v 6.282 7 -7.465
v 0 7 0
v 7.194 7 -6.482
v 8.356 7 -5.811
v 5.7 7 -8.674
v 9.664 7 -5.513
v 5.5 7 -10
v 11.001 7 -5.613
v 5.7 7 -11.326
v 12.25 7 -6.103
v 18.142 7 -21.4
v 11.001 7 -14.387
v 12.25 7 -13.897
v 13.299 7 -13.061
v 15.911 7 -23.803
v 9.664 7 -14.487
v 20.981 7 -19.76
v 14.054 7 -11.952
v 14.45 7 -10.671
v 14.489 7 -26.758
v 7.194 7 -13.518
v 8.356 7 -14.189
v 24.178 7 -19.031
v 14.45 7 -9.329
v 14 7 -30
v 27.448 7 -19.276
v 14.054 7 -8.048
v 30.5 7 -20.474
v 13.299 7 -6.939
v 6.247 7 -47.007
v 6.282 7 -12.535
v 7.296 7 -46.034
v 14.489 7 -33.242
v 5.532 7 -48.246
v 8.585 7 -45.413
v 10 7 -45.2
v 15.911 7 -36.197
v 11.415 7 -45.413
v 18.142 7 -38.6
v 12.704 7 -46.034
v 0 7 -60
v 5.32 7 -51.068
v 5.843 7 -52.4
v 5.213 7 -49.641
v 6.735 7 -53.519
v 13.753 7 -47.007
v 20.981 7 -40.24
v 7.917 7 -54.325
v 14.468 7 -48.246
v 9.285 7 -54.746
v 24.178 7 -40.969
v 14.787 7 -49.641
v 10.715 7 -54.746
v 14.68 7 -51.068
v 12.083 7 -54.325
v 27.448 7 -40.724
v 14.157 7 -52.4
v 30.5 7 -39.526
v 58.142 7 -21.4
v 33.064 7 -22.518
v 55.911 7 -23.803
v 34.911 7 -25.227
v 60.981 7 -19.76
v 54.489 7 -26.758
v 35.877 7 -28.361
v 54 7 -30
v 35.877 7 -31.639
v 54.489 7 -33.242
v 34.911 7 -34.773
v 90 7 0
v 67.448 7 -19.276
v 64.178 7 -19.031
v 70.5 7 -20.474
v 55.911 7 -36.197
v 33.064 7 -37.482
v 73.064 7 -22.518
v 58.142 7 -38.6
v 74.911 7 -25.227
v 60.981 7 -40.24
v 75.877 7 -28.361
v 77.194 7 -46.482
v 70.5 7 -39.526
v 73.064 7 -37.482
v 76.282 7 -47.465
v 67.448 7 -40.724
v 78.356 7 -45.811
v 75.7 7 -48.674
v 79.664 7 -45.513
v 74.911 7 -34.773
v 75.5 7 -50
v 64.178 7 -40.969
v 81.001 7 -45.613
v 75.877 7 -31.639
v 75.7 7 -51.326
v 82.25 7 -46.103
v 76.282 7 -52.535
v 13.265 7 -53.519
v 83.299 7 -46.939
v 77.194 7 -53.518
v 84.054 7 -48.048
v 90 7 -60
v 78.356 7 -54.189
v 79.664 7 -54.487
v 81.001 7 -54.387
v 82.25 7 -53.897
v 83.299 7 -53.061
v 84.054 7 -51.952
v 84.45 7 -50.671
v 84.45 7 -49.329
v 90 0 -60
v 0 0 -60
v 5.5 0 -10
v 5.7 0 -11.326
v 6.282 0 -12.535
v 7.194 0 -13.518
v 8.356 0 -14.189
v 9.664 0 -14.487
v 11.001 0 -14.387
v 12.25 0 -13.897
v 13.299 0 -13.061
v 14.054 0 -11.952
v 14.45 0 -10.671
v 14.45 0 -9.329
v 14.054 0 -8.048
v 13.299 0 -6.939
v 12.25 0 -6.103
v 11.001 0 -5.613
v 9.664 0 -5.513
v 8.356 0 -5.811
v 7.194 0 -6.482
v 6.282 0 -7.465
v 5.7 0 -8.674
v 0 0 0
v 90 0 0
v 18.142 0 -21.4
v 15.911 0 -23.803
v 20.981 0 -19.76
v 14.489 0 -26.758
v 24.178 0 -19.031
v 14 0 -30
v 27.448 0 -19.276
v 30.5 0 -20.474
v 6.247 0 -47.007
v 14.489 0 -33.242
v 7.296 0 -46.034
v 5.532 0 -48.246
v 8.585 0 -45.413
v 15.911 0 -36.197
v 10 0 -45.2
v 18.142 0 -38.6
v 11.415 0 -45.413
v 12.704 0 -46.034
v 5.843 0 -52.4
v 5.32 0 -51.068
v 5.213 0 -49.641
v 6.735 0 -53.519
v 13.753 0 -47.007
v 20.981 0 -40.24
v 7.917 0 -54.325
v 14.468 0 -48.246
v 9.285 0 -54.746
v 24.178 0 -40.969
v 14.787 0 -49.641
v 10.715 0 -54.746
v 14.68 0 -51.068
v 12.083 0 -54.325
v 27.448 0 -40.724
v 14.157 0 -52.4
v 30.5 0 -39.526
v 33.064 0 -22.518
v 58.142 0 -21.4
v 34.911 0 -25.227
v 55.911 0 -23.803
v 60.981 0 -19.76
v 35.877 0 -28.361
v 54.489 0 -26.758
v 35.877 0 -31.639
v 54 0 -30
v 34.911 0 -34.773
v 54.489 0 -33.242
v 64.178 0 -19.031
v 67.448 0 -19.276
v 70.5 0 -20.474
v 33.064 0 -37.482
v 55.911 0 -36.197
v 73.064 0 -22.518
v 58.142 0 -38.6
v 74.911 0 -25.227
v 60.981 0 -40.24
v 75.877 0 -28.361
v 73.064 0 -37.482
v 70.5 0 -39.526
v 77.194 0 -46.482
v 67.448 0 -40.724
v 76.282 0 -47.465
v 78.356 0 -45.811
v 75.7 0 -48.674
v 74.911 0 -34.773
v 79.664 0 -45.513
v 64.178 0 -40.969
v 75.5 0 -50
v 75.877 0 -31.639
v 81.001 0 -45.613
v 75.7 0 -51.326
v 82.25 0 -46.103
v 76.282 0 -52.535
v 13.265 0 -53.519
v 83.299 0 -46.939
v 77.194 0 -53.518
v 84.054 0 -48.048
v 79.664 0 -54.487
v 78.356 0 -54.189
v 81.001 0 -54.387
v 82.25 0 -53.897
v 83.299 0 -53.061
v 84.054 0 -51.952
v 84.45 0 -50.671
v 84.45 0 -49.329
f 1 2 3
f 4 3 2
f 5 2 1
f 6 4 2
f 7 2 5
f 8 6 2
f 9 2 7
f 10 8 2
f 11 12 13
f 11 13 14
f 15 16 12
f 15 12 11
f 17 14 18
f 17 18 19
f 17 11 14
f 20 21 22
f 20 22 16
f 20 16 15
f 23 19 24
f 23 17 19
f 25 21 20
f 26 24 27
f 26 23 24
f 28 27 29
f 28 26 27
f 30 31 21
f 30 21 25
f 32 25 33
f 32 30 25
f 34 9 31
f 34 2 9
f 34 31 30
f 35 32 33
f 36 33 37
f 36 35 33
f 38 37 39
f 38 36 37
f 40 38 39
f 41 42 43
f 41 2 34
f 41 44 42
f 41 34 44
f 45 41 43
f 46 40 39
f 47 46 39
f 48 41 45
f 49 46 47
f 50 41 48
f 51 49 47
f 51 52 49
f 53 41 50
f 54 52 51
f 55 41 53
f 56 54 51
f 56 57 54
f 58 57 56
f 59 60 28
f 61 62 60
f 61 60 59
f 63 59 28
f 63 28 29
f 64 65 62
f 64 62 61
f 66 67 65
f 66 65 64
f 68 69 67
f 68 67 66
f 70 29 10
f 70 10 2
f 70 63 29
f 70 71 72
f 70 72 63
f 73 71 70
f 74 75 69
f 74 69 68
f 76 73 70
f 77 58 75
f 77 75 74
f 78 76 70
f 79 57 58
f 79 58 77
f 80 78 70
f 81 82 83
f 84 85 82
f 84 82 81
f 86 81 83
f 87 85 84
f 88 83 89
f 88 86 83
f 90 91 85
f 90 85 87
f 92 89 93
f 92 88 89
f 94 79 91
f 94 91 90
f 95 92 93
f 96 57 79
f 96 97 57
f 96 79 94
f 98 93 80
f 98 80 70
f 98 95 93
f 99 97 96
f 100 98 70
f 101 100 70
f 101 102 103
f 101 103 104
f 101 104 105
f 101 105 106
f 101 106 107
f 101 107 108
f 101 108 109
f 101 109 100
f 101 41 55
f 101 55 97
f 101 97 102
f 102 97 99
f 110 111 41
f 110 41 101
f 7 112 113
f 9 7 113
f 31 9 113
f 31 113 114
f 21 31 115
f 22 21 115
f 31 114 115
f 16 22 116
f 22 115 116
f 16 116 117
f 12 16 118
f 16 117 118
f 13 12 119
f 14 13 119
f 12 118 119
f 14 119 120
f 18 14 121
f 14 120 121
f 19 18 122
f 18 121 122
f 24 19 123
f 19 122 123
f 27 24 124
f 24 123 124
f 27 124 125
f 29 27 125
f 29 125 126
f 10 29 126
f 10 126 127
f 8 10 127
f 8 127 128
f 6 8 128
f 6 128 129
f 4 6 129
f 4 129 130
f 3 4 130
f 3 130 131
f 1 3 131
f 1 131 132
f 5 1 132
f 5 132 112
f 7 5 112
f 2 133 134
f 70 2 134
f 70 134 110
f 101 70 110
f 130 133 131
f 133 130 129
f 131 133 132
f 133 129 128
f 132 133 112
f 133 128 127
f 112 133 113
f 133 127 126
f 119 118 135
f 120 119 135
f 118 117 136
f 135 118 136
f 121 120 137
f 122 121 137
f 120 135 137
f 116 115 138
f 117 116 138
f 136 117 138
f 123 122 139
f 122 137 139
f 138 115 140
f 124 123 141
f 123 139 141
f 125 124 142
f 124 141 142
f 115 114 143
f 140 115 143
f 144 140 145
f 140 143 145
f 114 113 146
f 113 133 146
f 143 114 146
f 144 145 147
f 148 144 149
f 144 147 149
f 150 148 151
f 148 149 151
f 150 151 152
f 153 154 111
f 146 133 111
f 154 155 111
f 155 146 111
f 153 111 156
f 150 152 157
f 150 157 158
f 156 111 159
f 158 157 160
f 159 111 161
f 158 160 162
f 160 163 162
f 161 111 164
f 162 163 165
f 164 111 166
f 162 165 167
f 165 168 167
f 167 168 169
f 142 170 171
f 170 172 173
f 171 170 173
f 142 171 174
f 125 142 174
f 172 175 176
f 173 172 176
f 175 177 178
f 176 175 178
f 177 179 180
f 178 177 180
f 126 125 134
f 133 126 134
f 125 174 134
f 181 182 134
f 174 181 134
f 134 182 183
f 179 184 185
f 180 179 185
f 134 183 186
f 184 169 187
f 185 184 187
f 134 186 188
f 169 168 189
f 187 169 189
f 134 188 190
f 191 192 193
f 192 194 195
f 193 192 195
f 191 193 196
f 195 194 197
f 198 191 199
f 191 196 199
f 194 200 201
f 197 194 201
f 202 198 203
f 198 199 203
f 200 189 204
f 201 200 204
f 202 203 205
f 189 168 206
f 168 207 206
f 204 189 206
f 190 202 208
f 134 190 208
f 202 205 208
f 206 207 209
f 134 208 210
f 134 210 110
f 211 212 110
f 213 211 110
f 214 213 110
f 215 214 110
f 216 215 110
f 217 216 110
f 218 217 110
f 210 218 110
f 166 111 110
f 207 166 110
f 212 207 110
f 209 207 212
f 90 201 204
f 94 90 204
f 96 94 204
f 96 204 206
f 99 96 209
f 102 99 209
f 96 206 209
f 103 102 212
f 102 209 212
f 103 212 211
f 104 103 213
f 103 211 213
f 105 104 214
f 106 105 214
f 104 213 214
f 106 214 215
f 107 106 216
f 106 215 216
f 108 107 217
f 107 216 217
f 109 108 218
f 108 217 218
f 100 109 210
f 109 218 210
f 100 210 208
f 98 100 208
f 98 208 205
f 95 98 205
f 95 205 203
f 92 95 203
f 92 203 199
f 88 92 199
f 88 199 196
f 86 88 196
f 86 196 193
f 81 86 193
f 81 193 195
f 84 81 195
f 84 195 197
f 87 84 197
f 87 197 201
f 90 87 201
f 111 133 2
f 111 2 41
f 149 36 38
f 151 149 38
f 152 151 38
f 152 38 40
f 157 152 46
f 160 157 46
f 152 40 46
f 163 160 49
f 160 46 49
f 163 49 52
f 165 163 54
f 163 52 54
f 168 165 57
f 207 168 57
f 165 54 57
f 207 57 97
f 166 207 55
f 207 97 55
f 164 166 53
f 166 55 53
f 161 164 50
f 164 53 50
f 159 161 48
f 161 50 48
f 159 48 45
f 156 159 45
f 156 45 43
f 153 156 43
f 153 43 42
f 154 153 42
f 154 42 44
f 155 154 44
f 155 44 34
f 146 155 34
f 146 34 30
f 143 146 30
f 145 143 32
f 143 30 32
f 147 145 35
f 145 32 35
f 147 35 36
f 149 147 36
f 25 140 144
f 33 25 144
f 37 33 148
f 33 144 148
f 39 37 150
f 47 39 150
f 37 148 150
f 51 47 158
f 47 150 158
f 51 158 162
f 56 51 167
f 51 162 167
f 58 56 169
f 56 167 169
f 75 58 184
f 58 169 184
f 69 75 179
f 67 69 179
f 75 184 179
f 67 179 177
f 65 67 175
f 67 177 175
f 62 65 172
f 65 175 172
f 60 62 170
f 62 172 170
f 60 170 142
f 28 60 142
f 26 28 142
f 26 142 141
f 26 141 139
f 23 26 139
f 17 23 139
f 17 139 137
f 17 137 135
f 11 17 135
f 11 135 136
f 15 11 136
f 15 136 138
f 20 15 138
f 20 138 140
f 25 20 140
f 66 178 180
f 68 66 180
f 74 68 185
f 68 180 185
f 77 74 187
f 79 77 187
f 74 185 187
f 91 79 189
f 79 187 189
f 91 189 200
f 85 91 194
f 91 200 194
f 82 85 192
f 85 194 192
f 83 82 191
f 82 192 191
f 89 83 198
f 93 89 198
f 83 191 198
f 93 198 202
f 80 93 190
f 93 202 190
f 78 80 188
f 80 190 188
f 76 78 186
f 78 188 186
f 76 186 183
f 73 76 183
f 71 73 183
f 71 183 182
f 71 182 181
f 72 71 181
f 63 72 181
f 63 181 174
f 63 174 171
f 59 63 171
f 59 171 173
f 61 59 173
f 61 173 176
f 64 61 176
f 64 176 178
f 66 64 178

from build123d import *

# Parameters (mm, degrees)
SKETCH1_W             = 90
SKETCH1_H             = 60
BOSS_EXTRUDE1_DEPTH   = 7
M20_CLEARANCE_SLOT1_D = 22
M8_CLEARANCE_SLOT1_D  = 9
SKETCH8_R             = 4.8
CUT_EXTRUDE1_DEPTH    = 7


with BuildPart() as part:
    # Sketch1 → Boss-Extrude1 (new body)
    with BuildSketch(Plane(origin=(0, 0, 0), x_dir=(1, 0, 0), z_dir=(0, 1, 0))):
        with Locations((45, 30)):
            Rectangle(SKETCH1_W, SKETCH1_H)
    extrude(amount=BOSS_EXTRUDE1_DEPTH)

    # M20 Clearance Slot1 (through all)
    with Locations(Plane(origin=(0, 7, 0), x_dir=(1, 0, 0), z_dir=(0, 1, 0))):
        with Locations((25, 30), (65, 30)):
            Hole(M20_CLEARANCE_SLOT1_D / 2)

    # M8 Clearance Slot1 (through all)
    with Locations(Plane(origin=(0, 7, 0), x_dir=(1, 0, 0), z_dir=(0, 1, 0))):
        with Locations((80, 50), (10, 10)):
            Hole(M8_CLEARANCE_SLOT1_D / 2)

    # Sketch8 → Cut-Extrude1 (cut)
    with BuildSketch(Plane(origin=(0, 7, 0), x_dir=(1, 0, 0), z_dir=(0, 1, 0))):
        with Locations(Location((10, 50, 0), (0, 0, 270))):
            Circle(SKETCH8_R)
    extrude(amount=-CUT_EXTRUDE1_DEPTH, mode=Mode.SUBTRACT)


solid = part.part
